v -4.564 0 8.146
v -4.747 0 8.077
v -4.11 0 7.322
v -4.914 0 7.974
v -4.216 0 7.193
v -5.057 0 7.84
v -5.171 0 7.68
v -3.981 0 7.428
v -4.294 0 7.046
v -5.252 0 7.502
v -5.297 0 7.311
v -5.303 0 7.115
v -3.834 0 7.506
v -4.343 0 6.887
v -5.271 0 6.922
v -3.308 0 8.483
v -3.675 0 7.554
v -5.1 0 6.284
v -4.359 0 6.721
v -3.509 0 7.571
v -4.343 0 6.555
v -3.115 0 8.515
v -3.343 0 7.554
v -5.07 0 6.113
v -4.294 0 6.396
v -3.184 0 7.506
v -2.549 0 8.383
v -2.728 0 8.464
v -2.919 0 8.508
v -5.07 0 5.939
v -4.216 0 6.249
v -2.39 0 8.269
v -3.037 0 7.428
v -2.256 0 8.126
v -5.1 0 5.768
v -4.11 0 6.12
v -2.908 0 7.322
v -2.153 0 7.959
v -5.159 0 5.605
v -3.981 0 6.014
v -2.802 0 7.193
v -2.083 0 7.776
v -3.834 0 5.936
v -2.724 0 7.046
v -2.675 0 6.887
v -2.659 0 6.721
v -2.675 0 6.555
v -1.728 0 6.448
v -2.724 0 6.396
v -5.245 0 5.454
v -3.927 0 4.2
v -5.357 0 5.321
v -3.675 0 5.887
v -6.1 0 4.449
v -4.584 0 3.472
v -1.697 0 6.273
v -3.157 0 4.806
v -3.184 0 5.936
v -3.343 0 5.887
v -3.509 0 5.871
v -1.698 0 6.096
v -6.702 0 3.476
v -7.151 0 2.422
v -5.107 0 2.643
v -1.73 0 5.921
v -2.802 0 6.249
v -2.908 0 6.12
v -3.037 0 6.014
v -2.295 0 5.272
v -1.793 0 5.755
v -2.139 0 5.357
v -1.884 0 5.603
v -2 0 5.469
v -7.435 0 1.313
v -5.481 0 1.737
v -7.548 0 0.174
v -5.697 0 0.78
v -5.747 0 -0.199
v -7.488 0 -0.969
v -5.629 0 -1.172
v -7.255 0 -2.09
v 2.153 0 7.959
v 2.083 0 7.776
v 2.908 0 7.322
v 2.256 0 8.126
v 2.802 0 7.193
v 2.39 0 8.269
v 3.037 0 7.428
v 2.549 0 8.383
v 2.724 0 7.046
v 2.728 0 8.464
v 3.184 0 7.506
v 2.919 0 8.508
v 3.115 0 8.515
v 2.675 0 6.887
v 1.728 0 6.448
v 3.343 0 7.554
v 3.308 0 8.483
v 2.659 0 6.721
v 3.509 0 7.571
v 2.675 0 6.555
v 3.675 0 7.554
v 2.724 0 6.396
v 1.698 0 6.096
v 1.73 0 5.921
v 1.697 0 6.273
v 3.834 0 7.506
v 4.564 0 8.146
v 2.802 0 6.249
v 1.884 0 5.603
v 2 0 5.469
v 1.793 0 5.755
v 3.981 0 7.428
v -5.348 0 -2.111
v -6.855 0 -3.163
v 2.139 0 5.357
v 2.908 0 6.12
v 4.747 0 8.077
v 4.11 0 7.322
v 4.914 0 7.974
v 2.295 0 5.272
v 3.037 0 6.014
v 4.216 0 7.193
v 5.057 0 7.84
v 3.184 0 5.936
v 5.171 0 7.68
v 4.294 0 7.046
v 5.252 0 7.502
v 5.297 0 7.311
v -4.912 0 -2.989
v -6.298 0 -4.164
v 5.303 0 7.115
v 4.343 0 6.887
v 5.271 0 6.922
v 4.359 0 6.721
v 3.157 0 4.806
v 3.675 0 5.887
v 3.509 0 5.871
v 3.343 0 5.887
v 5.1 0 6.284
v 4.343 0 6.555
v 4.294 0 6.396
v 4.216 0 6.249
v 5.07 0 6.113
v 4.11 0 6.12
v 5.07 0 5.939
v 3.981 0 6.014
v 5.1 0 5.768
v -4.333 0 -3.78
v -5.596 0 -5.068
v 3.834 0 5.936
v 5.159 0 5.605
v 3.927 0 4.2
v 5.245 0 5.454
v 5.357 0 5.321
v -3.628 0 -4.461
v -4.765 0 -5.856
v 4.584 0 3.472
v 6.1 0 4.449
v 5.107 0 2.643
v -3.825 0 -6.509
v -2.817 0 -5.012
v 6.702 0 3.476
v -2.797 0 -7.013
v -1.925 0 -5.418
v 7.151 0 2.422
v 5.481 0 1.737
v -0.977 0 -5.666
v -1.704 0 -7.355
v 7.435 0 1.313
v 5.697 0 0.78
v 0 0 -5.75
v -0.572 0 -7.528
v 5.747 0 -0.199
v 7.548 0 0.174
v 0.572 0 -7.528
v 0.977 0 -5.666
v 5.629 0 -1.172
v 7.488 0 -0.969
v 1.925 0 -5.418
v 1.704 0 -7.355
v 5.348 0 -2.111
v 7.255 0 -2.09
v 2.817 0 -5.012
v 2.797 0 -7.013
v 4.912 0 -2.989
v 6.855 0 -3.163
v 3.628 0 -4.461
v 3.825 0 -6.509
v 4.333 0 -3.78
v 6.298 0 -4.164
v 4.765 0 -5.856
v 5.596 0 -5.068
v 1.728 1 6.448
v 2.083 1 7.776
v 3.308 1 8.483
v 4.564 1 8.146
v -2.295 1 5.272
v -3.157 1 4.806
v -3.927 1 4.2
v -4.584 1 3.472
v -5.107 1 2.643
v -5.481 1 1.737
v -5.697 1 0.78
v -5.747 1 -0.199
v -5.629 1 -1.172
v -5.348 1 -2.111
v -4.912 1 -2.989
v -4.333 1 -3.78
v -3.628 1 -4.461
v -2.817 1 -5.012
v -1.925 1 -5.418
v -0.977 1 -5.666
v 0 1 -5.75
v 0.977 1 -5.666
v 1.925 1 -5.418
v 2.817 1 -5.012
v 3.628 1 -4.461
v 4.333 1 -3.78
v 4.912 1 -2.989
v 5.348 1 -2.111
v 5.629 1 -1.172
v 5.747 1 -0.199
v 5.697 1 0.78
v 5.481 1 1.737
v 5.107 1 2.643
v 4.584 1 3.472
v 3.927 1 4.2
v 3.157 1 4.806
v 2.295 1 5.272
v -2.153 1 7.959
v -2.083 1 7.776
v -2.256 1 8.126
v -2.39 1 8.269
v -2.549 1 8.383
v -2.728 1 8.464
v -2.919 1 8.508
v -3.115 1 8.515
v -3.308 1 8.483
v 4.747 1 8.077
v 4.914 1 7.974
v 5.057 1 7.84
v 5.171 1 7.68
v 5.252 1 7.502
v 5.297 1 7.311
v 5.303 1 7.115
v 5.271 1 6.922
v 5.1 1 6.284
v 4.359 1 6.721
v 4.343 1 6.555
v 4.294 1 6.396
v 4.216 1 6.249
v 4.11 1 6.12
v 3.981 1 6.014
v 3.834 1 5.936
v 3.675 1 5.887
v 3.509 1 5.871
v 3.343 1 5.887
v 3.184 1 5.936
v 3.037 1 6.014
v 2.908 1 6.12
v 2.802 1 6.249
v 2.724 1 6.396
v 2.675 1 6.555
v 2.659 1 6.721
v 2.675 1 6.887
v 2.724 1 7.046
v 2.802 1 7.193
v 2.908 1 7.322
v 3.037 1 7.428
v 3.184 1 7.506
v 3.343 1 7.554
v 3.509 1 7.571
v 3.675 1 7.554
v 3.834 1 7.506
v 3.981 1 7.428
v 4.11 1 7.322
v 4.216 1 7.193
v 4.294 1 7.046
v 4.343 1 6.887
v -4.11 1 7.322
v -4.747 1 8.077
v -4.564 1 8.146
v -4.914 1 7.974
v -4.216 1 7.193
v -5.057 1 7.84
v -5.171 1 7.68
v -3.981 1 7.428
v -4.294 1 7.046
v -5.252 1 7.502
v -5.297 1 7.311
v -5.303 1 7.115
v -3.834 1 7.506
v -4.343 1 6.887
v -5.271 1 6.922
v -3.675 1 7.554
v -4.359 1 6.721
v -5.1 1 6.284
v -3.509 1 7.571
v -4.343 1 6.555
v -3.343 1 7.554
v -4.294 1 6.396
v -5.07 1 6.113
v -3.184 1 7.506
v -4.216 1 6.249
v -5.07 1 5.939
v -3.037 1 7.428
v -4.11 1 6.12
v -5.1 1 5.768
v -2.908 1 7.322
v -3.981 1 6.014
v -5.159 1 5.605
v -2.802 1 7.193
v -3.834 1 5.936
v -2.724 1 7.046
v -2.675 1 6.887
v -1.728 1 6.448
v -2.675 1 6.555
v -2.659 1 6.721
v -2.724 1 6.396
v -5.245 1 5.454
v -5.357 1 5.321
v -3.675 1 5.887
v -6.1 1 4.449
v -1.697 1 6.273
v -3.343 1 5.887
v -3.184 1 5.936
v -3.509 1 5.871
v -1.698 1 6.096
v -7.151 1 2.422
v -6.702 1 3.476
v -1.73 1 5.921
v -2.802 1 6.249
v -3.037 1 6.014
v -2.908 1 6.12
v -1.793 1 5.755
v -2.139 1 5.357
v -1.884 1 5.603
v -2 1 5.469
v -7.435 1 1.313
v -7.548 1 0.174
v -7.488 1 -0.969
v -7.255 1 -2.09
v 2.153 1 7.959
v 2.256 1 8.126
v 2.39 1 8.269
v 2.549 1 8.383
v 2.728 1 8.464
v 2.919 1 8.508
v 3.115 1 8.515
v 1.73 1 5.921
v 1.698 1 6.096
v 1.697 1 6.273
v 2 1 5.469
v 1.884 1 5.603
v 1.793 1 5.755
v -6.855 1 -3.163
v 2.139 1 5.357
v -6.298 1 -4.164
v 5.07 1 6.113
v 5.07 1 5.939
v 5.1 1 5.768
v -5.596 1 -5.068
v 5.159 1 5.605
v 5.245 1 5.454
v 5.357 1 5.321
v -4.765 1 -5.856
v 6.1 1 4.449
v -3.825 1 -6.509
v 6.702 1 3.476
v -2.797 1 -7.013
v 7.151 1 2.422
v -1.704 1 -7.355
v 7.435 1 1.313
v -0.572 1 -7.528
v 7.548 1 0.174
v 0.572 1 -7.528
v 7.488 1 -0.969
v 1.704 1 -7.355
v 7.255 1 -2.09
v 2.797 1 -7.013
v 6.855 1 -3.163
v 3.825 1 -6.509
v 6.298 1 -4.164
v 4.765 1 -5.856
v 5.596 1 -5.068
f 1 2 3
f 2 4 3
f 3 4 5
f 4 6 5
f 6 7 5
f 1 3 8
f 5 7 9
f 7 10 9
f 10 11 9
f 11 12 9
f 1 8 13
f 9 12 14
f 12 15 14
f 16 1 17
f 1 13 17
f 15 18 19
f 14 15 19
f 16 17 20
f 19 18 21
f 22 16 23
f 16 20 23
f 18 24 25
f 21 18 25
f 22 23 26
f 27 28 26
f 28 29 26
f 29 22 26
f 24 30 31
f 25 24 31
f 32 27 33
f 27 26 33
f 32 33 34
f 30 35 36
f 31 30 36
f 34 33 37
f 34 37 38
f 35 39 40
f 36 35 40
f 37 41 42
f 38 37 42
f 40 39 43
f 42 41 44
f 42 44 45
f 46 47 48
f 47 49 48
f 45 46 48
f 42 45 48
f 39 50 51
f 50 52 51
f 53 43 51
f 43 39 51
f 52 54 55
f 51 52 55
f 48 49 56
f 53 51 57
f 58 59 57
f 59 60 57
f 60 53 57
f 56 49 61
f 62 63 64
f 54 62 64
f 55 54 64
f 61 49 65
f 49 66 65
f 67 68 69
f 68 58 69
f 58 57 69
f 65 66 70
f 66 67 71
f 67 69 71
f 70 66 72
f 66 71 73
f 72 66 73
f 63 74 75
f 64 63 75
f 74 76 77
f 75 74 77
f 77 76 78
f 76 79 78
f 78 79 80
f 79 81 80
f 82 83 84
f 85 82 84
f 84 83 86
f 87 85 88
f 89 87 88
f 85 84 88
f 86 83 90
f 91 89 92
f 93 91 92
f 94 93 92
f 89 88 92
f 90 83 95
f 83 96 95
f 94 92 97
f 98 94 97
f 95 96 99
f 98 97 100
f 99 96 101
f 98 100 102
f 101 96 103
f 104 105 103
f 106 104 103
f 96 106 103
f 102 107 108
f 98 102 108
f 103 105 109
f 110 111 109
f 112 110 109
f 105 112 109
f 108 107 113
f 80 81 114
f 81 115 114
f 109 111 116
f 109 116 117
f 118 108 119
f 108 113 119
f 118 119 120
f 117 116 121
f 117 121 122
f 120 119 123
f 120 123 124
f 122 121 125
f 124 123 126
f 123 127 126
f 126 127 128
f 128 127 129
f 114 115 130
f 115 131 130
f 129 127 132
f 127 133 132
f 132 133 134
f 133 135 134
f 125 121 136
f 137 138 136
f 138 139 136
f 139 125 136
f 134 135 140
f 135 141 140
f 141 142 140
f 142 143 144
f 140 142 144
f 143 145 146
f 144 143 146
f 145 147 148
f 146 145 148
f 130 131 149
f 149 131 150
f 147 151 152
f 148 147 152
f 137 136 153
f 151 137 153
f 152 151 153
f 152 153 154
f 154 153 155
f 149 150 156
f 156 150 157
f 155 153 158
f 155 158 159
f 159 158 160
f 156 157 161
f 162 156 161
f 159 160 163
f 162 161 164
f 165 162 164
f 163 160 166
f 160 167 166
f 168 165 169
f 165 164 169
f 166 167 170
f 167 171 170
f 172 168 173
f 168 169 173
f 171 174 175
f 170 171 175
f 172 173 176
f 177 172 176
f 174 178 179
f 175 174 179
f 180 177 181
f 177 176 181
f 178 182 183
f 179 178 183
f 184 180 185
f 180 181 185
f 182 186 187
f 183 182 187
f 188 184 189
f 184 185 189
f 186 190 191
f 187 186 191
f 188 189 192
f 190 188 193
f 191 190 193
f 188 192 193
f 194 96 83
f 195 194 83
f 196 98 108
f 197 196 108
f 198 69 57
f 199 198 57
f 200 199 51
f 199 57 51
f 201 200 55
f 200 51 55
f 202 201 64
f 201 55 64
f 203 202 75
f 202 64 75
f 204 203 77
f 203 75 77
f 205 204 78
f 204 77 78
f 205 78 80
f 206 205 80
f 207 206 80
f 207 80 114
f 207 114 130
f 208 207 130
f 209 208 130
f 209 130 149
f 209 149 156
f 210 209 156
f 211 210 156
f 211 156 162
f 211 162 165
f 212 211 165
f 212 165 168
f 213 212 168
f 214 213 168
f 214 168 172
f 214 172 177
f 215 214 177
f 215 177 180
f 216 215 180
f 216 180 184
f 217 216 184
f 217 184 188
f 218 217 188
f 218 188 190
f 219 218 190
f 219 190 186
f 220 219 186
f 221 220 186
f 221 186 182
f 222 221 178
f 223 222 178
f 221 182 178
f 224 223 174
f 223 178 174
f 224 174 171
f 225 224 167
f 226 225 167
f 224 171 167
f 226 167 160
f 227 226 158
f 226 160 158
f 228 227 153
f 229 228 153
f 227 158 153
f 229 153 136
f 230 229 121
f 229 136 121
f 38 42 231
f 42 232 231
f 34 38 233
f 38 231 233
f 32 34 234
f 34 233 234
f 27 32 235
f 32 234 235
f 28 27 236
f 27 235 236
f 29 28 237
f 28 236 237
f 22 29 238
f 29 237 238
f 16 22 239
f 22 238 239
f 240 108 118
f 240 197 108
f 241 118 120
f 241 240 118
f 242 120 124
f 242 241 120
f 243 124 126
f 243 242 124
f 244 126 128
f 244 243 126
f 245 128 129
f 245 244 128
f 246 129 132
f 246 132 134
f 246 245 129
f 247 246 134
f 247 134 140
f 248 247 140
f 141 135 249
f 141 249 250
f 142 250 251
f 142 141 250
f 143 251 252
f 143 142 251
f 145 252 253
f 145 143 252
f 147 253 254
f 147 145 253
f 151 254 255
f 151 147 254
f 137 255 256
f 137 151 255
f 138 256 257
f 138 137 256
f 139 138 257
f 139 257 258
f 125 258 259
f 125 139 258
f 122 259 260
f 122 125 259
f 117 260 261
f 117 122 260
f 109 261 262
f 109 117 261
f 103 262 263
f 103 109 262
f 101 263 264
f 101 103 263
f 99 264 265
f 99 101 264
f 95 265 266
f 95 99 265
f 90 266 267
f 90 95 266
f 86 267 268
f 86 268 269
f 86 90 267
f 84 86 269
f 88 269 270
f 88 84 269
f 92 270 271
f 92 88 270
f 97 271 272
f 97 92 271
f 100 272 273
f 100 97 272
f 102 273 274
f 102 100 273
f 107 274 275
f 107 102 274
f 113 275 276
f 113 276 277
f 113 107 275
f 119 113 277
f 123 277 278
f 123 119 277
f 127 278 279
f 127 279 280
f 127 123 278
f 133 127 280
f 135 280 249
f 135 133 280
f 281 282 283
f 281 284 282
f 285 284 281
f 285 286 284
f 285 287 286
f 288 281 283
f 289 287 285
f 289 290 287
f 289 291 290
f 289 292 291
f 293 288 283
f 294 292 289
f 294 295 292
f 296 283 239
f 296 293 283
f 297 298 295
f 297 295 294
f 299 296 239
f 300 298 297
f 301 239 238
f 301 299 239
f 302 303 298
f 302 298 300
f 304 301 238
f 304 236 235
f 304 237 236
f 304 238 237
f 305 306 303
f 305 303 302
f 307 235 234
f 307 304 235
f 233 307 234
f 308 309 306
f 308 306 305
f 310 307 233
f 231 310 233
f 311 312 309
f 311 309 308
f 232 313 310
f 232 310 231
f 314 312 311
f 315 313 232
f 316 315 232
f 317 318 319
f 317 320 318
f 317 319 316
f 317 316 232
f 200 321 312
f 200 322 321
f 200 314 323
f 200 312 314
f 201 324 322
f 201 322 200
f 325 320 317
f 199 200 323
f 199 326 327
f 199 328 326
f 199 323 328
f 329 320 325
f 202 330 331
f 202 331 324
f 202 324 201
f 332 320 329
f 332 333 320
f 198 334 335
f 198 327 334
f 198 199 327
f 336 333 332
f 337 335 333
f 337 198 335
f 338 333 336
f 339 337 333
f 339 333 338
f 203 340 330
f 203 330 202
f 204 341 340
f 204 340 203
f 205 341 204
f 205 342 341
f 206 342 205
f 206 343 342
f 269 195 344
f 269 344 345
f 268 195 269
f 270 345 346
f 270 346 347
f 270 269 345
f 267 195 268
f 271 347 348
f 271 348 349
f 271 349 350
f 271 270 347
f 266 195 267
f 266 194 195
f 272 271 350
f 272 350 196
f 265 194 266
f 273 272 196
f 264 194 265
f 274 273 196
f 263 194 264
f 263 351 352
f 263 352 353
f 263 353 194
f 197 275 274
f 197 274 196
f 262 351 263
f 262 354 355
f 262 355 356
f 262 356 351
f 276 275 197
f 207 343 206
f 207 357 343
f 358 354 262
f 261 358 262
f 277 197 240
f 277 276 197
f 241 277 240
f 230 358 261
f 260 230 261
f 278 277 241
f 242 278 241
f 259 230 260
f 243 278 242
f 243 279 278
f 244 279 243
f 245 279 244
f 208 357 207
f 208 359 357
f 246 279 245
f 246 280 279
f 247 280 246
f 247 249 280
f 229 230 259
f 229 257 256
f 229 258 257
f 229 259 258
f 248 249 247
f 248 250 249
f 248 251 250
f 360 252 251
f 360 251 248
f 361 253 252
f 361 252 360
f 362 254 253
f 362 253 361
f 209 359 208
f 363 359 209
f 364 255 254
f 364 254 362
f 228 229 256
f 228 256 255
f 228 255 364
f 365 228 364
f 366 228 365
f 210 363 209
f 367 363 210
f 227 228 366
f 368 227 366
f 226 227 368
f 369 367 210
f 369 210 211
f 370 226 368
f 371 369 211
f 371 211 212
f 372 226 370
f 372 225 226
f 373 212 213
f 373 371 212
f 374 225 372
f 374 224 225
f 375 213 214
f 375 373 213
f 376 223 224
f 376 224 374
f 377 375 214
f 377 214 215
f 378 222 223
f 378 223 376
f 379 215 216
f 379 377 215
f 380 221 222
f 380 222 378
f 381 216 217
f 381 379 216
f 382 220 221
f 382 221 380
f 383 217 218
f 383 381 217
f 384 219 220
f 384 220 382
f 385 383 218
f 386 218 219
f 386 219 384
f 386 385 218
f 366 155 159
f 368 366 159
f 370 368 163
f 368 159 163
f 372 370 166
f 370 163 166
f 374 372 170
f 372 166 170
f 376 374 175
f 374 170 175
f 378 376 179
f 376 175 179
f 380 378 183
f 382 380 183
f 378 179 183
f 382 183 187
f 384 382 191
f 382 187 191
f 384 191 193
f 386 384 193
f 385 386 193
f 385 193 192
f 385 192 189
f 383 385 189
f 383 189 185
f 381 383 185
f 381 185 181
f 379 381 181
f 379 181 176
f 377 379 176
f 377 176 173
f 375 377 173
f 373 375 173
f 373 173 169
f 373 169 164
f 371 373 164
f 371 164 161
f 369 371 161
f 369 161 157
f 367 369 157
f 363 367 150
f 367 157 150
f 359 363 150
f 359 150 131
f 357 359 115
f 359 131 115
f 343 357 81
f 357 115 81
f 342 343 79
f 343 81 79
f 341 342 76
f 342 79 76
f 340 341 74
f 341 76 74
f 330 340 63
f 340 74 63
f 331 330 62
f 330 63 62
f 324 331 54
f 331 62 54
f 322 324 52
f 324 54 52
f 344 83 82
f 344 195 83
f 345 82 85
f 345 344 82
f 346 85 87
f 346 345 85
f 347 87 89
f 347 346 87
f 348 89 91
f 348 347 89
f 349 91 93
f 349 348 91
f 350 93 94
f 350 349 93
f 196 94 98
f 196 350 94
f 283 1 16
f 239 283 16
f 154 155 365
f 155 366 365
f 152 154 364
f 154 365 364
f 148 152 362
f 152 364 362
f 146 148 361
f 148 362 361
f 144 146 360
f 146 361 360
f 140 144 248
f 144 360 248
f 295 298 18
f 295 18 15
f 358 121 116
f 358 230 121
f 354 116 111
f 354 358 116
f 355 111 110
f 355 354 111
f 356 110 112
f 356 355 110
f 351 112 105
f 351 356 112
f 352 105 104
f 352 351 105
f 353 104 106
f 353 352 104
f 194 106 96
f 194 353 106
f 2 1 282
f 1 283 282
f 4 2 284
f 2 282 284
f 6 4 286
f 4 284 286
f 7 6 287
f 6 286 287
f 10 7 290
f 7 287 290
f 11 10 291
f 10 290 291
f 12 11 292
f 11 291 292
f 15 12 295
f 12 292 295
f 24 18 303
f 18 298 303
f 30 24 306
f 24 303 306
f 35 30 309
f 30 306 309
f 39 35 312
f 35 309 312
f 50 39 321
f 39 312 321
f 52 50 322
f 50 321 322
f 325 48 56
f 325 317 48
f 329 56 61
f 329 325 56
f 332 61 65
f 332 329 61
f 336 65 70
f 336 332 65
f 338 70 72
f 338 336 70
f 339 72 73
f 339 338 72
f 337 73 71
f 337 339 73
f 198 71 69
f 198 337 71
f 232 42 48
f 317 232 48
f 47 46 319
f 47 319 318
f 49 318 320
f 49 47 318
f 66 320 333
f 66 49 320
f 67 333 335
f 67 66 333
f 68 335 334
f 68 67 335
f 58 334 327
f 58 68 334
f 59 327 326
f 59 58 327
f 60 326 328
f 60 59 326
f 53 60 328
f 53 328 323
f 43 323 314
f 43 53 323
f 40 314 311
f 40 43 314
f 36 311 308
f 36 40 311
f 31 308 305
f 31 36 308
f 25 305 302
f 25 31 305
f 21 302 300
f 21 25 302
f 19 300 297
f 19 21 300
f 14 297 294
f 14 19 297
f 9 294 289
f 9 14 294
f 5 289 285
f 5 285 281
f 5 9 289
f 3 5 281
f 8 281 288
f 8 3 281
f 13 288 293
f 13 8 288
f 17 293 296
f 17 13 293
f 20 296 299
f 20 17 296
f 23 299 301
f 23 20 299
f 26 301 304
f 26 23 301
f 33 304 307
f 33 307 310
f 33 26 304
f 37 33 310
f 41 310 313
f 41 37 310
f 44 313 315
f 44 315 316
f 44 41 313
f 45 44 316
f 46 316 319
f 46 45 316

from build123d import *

# Parameters (mm, degrees)
SKETCH1_R           = 0.85
BOSS_EXTRUDE1_DEPTH = 1
FILLET1_R           = 1


with BuildPart() as part:
    # Sketch1 → Boss-Extrude1 (new body)
    with BuildSketch(Plane(origin=(0, 0, 0), x_dir=(1, 0, 0), z_dir=(0, 1, 0))):
        with BuildLine():
            Line((-2.342312358, -8.741628728), (-1.488209509, -5.554073501))
            ThreePointArc((-1.488209509, -5.554073501), (0, 5.75), (1.488209509, -5.554073501))
            Line((1.488209509, -5.554073501), (2.342312358, -8.741628728))
            Line((2.342312358, -8.741628728), (5.529867585, -7.887525879))
            Line((5.529867585, -7.887525879), (4.94509663, -5.705130964))
            ThreePointArc((4.94509663, -5.705130964), (0, 7.55), (-4.94509663, -5.705130964))
            Line((-4.94509663, -5.705130964), (-5.529867585, -7.887525879))
            Line((-5.529867585, -7.887525879), (-2.342312358, -8.741628728))
        make_face()
        with Locations((-3.509038547, -6.72079969)):
            Circle(SKETCH1_R, mode=Mode.SUBTRACT)
        with Locations((3.509038547, -6.72079969)):
            Circle(SKETCH1_R, mode=Mode.SUBTRACT)
    extrude(amount=BOSS_EXTRUDE1_DEPTH)

    # Fillet1
    fillet1_edges = [part.edges().sort_by_distance(p)[0] for p in [
        (5.529867585, 0.5, 7.887525879),
        (2.342312358, 0.5, 8.741628728),
        (1.488209509, 0.5, 5.554073501),
        (-1.488209509, 0.5, 5.554073501),
        (-2.342312358, 0.5, 8.741628728),
        (-5.529867585, 0.5, 7.887525879),
        (-4.94509663, 0.5, 5.705130964),
        (4.94509663, 0.5, 5.705130964),
    ]]
    fillet(fillet1_edges, radius=FILLET1_R)


solid = part.part
